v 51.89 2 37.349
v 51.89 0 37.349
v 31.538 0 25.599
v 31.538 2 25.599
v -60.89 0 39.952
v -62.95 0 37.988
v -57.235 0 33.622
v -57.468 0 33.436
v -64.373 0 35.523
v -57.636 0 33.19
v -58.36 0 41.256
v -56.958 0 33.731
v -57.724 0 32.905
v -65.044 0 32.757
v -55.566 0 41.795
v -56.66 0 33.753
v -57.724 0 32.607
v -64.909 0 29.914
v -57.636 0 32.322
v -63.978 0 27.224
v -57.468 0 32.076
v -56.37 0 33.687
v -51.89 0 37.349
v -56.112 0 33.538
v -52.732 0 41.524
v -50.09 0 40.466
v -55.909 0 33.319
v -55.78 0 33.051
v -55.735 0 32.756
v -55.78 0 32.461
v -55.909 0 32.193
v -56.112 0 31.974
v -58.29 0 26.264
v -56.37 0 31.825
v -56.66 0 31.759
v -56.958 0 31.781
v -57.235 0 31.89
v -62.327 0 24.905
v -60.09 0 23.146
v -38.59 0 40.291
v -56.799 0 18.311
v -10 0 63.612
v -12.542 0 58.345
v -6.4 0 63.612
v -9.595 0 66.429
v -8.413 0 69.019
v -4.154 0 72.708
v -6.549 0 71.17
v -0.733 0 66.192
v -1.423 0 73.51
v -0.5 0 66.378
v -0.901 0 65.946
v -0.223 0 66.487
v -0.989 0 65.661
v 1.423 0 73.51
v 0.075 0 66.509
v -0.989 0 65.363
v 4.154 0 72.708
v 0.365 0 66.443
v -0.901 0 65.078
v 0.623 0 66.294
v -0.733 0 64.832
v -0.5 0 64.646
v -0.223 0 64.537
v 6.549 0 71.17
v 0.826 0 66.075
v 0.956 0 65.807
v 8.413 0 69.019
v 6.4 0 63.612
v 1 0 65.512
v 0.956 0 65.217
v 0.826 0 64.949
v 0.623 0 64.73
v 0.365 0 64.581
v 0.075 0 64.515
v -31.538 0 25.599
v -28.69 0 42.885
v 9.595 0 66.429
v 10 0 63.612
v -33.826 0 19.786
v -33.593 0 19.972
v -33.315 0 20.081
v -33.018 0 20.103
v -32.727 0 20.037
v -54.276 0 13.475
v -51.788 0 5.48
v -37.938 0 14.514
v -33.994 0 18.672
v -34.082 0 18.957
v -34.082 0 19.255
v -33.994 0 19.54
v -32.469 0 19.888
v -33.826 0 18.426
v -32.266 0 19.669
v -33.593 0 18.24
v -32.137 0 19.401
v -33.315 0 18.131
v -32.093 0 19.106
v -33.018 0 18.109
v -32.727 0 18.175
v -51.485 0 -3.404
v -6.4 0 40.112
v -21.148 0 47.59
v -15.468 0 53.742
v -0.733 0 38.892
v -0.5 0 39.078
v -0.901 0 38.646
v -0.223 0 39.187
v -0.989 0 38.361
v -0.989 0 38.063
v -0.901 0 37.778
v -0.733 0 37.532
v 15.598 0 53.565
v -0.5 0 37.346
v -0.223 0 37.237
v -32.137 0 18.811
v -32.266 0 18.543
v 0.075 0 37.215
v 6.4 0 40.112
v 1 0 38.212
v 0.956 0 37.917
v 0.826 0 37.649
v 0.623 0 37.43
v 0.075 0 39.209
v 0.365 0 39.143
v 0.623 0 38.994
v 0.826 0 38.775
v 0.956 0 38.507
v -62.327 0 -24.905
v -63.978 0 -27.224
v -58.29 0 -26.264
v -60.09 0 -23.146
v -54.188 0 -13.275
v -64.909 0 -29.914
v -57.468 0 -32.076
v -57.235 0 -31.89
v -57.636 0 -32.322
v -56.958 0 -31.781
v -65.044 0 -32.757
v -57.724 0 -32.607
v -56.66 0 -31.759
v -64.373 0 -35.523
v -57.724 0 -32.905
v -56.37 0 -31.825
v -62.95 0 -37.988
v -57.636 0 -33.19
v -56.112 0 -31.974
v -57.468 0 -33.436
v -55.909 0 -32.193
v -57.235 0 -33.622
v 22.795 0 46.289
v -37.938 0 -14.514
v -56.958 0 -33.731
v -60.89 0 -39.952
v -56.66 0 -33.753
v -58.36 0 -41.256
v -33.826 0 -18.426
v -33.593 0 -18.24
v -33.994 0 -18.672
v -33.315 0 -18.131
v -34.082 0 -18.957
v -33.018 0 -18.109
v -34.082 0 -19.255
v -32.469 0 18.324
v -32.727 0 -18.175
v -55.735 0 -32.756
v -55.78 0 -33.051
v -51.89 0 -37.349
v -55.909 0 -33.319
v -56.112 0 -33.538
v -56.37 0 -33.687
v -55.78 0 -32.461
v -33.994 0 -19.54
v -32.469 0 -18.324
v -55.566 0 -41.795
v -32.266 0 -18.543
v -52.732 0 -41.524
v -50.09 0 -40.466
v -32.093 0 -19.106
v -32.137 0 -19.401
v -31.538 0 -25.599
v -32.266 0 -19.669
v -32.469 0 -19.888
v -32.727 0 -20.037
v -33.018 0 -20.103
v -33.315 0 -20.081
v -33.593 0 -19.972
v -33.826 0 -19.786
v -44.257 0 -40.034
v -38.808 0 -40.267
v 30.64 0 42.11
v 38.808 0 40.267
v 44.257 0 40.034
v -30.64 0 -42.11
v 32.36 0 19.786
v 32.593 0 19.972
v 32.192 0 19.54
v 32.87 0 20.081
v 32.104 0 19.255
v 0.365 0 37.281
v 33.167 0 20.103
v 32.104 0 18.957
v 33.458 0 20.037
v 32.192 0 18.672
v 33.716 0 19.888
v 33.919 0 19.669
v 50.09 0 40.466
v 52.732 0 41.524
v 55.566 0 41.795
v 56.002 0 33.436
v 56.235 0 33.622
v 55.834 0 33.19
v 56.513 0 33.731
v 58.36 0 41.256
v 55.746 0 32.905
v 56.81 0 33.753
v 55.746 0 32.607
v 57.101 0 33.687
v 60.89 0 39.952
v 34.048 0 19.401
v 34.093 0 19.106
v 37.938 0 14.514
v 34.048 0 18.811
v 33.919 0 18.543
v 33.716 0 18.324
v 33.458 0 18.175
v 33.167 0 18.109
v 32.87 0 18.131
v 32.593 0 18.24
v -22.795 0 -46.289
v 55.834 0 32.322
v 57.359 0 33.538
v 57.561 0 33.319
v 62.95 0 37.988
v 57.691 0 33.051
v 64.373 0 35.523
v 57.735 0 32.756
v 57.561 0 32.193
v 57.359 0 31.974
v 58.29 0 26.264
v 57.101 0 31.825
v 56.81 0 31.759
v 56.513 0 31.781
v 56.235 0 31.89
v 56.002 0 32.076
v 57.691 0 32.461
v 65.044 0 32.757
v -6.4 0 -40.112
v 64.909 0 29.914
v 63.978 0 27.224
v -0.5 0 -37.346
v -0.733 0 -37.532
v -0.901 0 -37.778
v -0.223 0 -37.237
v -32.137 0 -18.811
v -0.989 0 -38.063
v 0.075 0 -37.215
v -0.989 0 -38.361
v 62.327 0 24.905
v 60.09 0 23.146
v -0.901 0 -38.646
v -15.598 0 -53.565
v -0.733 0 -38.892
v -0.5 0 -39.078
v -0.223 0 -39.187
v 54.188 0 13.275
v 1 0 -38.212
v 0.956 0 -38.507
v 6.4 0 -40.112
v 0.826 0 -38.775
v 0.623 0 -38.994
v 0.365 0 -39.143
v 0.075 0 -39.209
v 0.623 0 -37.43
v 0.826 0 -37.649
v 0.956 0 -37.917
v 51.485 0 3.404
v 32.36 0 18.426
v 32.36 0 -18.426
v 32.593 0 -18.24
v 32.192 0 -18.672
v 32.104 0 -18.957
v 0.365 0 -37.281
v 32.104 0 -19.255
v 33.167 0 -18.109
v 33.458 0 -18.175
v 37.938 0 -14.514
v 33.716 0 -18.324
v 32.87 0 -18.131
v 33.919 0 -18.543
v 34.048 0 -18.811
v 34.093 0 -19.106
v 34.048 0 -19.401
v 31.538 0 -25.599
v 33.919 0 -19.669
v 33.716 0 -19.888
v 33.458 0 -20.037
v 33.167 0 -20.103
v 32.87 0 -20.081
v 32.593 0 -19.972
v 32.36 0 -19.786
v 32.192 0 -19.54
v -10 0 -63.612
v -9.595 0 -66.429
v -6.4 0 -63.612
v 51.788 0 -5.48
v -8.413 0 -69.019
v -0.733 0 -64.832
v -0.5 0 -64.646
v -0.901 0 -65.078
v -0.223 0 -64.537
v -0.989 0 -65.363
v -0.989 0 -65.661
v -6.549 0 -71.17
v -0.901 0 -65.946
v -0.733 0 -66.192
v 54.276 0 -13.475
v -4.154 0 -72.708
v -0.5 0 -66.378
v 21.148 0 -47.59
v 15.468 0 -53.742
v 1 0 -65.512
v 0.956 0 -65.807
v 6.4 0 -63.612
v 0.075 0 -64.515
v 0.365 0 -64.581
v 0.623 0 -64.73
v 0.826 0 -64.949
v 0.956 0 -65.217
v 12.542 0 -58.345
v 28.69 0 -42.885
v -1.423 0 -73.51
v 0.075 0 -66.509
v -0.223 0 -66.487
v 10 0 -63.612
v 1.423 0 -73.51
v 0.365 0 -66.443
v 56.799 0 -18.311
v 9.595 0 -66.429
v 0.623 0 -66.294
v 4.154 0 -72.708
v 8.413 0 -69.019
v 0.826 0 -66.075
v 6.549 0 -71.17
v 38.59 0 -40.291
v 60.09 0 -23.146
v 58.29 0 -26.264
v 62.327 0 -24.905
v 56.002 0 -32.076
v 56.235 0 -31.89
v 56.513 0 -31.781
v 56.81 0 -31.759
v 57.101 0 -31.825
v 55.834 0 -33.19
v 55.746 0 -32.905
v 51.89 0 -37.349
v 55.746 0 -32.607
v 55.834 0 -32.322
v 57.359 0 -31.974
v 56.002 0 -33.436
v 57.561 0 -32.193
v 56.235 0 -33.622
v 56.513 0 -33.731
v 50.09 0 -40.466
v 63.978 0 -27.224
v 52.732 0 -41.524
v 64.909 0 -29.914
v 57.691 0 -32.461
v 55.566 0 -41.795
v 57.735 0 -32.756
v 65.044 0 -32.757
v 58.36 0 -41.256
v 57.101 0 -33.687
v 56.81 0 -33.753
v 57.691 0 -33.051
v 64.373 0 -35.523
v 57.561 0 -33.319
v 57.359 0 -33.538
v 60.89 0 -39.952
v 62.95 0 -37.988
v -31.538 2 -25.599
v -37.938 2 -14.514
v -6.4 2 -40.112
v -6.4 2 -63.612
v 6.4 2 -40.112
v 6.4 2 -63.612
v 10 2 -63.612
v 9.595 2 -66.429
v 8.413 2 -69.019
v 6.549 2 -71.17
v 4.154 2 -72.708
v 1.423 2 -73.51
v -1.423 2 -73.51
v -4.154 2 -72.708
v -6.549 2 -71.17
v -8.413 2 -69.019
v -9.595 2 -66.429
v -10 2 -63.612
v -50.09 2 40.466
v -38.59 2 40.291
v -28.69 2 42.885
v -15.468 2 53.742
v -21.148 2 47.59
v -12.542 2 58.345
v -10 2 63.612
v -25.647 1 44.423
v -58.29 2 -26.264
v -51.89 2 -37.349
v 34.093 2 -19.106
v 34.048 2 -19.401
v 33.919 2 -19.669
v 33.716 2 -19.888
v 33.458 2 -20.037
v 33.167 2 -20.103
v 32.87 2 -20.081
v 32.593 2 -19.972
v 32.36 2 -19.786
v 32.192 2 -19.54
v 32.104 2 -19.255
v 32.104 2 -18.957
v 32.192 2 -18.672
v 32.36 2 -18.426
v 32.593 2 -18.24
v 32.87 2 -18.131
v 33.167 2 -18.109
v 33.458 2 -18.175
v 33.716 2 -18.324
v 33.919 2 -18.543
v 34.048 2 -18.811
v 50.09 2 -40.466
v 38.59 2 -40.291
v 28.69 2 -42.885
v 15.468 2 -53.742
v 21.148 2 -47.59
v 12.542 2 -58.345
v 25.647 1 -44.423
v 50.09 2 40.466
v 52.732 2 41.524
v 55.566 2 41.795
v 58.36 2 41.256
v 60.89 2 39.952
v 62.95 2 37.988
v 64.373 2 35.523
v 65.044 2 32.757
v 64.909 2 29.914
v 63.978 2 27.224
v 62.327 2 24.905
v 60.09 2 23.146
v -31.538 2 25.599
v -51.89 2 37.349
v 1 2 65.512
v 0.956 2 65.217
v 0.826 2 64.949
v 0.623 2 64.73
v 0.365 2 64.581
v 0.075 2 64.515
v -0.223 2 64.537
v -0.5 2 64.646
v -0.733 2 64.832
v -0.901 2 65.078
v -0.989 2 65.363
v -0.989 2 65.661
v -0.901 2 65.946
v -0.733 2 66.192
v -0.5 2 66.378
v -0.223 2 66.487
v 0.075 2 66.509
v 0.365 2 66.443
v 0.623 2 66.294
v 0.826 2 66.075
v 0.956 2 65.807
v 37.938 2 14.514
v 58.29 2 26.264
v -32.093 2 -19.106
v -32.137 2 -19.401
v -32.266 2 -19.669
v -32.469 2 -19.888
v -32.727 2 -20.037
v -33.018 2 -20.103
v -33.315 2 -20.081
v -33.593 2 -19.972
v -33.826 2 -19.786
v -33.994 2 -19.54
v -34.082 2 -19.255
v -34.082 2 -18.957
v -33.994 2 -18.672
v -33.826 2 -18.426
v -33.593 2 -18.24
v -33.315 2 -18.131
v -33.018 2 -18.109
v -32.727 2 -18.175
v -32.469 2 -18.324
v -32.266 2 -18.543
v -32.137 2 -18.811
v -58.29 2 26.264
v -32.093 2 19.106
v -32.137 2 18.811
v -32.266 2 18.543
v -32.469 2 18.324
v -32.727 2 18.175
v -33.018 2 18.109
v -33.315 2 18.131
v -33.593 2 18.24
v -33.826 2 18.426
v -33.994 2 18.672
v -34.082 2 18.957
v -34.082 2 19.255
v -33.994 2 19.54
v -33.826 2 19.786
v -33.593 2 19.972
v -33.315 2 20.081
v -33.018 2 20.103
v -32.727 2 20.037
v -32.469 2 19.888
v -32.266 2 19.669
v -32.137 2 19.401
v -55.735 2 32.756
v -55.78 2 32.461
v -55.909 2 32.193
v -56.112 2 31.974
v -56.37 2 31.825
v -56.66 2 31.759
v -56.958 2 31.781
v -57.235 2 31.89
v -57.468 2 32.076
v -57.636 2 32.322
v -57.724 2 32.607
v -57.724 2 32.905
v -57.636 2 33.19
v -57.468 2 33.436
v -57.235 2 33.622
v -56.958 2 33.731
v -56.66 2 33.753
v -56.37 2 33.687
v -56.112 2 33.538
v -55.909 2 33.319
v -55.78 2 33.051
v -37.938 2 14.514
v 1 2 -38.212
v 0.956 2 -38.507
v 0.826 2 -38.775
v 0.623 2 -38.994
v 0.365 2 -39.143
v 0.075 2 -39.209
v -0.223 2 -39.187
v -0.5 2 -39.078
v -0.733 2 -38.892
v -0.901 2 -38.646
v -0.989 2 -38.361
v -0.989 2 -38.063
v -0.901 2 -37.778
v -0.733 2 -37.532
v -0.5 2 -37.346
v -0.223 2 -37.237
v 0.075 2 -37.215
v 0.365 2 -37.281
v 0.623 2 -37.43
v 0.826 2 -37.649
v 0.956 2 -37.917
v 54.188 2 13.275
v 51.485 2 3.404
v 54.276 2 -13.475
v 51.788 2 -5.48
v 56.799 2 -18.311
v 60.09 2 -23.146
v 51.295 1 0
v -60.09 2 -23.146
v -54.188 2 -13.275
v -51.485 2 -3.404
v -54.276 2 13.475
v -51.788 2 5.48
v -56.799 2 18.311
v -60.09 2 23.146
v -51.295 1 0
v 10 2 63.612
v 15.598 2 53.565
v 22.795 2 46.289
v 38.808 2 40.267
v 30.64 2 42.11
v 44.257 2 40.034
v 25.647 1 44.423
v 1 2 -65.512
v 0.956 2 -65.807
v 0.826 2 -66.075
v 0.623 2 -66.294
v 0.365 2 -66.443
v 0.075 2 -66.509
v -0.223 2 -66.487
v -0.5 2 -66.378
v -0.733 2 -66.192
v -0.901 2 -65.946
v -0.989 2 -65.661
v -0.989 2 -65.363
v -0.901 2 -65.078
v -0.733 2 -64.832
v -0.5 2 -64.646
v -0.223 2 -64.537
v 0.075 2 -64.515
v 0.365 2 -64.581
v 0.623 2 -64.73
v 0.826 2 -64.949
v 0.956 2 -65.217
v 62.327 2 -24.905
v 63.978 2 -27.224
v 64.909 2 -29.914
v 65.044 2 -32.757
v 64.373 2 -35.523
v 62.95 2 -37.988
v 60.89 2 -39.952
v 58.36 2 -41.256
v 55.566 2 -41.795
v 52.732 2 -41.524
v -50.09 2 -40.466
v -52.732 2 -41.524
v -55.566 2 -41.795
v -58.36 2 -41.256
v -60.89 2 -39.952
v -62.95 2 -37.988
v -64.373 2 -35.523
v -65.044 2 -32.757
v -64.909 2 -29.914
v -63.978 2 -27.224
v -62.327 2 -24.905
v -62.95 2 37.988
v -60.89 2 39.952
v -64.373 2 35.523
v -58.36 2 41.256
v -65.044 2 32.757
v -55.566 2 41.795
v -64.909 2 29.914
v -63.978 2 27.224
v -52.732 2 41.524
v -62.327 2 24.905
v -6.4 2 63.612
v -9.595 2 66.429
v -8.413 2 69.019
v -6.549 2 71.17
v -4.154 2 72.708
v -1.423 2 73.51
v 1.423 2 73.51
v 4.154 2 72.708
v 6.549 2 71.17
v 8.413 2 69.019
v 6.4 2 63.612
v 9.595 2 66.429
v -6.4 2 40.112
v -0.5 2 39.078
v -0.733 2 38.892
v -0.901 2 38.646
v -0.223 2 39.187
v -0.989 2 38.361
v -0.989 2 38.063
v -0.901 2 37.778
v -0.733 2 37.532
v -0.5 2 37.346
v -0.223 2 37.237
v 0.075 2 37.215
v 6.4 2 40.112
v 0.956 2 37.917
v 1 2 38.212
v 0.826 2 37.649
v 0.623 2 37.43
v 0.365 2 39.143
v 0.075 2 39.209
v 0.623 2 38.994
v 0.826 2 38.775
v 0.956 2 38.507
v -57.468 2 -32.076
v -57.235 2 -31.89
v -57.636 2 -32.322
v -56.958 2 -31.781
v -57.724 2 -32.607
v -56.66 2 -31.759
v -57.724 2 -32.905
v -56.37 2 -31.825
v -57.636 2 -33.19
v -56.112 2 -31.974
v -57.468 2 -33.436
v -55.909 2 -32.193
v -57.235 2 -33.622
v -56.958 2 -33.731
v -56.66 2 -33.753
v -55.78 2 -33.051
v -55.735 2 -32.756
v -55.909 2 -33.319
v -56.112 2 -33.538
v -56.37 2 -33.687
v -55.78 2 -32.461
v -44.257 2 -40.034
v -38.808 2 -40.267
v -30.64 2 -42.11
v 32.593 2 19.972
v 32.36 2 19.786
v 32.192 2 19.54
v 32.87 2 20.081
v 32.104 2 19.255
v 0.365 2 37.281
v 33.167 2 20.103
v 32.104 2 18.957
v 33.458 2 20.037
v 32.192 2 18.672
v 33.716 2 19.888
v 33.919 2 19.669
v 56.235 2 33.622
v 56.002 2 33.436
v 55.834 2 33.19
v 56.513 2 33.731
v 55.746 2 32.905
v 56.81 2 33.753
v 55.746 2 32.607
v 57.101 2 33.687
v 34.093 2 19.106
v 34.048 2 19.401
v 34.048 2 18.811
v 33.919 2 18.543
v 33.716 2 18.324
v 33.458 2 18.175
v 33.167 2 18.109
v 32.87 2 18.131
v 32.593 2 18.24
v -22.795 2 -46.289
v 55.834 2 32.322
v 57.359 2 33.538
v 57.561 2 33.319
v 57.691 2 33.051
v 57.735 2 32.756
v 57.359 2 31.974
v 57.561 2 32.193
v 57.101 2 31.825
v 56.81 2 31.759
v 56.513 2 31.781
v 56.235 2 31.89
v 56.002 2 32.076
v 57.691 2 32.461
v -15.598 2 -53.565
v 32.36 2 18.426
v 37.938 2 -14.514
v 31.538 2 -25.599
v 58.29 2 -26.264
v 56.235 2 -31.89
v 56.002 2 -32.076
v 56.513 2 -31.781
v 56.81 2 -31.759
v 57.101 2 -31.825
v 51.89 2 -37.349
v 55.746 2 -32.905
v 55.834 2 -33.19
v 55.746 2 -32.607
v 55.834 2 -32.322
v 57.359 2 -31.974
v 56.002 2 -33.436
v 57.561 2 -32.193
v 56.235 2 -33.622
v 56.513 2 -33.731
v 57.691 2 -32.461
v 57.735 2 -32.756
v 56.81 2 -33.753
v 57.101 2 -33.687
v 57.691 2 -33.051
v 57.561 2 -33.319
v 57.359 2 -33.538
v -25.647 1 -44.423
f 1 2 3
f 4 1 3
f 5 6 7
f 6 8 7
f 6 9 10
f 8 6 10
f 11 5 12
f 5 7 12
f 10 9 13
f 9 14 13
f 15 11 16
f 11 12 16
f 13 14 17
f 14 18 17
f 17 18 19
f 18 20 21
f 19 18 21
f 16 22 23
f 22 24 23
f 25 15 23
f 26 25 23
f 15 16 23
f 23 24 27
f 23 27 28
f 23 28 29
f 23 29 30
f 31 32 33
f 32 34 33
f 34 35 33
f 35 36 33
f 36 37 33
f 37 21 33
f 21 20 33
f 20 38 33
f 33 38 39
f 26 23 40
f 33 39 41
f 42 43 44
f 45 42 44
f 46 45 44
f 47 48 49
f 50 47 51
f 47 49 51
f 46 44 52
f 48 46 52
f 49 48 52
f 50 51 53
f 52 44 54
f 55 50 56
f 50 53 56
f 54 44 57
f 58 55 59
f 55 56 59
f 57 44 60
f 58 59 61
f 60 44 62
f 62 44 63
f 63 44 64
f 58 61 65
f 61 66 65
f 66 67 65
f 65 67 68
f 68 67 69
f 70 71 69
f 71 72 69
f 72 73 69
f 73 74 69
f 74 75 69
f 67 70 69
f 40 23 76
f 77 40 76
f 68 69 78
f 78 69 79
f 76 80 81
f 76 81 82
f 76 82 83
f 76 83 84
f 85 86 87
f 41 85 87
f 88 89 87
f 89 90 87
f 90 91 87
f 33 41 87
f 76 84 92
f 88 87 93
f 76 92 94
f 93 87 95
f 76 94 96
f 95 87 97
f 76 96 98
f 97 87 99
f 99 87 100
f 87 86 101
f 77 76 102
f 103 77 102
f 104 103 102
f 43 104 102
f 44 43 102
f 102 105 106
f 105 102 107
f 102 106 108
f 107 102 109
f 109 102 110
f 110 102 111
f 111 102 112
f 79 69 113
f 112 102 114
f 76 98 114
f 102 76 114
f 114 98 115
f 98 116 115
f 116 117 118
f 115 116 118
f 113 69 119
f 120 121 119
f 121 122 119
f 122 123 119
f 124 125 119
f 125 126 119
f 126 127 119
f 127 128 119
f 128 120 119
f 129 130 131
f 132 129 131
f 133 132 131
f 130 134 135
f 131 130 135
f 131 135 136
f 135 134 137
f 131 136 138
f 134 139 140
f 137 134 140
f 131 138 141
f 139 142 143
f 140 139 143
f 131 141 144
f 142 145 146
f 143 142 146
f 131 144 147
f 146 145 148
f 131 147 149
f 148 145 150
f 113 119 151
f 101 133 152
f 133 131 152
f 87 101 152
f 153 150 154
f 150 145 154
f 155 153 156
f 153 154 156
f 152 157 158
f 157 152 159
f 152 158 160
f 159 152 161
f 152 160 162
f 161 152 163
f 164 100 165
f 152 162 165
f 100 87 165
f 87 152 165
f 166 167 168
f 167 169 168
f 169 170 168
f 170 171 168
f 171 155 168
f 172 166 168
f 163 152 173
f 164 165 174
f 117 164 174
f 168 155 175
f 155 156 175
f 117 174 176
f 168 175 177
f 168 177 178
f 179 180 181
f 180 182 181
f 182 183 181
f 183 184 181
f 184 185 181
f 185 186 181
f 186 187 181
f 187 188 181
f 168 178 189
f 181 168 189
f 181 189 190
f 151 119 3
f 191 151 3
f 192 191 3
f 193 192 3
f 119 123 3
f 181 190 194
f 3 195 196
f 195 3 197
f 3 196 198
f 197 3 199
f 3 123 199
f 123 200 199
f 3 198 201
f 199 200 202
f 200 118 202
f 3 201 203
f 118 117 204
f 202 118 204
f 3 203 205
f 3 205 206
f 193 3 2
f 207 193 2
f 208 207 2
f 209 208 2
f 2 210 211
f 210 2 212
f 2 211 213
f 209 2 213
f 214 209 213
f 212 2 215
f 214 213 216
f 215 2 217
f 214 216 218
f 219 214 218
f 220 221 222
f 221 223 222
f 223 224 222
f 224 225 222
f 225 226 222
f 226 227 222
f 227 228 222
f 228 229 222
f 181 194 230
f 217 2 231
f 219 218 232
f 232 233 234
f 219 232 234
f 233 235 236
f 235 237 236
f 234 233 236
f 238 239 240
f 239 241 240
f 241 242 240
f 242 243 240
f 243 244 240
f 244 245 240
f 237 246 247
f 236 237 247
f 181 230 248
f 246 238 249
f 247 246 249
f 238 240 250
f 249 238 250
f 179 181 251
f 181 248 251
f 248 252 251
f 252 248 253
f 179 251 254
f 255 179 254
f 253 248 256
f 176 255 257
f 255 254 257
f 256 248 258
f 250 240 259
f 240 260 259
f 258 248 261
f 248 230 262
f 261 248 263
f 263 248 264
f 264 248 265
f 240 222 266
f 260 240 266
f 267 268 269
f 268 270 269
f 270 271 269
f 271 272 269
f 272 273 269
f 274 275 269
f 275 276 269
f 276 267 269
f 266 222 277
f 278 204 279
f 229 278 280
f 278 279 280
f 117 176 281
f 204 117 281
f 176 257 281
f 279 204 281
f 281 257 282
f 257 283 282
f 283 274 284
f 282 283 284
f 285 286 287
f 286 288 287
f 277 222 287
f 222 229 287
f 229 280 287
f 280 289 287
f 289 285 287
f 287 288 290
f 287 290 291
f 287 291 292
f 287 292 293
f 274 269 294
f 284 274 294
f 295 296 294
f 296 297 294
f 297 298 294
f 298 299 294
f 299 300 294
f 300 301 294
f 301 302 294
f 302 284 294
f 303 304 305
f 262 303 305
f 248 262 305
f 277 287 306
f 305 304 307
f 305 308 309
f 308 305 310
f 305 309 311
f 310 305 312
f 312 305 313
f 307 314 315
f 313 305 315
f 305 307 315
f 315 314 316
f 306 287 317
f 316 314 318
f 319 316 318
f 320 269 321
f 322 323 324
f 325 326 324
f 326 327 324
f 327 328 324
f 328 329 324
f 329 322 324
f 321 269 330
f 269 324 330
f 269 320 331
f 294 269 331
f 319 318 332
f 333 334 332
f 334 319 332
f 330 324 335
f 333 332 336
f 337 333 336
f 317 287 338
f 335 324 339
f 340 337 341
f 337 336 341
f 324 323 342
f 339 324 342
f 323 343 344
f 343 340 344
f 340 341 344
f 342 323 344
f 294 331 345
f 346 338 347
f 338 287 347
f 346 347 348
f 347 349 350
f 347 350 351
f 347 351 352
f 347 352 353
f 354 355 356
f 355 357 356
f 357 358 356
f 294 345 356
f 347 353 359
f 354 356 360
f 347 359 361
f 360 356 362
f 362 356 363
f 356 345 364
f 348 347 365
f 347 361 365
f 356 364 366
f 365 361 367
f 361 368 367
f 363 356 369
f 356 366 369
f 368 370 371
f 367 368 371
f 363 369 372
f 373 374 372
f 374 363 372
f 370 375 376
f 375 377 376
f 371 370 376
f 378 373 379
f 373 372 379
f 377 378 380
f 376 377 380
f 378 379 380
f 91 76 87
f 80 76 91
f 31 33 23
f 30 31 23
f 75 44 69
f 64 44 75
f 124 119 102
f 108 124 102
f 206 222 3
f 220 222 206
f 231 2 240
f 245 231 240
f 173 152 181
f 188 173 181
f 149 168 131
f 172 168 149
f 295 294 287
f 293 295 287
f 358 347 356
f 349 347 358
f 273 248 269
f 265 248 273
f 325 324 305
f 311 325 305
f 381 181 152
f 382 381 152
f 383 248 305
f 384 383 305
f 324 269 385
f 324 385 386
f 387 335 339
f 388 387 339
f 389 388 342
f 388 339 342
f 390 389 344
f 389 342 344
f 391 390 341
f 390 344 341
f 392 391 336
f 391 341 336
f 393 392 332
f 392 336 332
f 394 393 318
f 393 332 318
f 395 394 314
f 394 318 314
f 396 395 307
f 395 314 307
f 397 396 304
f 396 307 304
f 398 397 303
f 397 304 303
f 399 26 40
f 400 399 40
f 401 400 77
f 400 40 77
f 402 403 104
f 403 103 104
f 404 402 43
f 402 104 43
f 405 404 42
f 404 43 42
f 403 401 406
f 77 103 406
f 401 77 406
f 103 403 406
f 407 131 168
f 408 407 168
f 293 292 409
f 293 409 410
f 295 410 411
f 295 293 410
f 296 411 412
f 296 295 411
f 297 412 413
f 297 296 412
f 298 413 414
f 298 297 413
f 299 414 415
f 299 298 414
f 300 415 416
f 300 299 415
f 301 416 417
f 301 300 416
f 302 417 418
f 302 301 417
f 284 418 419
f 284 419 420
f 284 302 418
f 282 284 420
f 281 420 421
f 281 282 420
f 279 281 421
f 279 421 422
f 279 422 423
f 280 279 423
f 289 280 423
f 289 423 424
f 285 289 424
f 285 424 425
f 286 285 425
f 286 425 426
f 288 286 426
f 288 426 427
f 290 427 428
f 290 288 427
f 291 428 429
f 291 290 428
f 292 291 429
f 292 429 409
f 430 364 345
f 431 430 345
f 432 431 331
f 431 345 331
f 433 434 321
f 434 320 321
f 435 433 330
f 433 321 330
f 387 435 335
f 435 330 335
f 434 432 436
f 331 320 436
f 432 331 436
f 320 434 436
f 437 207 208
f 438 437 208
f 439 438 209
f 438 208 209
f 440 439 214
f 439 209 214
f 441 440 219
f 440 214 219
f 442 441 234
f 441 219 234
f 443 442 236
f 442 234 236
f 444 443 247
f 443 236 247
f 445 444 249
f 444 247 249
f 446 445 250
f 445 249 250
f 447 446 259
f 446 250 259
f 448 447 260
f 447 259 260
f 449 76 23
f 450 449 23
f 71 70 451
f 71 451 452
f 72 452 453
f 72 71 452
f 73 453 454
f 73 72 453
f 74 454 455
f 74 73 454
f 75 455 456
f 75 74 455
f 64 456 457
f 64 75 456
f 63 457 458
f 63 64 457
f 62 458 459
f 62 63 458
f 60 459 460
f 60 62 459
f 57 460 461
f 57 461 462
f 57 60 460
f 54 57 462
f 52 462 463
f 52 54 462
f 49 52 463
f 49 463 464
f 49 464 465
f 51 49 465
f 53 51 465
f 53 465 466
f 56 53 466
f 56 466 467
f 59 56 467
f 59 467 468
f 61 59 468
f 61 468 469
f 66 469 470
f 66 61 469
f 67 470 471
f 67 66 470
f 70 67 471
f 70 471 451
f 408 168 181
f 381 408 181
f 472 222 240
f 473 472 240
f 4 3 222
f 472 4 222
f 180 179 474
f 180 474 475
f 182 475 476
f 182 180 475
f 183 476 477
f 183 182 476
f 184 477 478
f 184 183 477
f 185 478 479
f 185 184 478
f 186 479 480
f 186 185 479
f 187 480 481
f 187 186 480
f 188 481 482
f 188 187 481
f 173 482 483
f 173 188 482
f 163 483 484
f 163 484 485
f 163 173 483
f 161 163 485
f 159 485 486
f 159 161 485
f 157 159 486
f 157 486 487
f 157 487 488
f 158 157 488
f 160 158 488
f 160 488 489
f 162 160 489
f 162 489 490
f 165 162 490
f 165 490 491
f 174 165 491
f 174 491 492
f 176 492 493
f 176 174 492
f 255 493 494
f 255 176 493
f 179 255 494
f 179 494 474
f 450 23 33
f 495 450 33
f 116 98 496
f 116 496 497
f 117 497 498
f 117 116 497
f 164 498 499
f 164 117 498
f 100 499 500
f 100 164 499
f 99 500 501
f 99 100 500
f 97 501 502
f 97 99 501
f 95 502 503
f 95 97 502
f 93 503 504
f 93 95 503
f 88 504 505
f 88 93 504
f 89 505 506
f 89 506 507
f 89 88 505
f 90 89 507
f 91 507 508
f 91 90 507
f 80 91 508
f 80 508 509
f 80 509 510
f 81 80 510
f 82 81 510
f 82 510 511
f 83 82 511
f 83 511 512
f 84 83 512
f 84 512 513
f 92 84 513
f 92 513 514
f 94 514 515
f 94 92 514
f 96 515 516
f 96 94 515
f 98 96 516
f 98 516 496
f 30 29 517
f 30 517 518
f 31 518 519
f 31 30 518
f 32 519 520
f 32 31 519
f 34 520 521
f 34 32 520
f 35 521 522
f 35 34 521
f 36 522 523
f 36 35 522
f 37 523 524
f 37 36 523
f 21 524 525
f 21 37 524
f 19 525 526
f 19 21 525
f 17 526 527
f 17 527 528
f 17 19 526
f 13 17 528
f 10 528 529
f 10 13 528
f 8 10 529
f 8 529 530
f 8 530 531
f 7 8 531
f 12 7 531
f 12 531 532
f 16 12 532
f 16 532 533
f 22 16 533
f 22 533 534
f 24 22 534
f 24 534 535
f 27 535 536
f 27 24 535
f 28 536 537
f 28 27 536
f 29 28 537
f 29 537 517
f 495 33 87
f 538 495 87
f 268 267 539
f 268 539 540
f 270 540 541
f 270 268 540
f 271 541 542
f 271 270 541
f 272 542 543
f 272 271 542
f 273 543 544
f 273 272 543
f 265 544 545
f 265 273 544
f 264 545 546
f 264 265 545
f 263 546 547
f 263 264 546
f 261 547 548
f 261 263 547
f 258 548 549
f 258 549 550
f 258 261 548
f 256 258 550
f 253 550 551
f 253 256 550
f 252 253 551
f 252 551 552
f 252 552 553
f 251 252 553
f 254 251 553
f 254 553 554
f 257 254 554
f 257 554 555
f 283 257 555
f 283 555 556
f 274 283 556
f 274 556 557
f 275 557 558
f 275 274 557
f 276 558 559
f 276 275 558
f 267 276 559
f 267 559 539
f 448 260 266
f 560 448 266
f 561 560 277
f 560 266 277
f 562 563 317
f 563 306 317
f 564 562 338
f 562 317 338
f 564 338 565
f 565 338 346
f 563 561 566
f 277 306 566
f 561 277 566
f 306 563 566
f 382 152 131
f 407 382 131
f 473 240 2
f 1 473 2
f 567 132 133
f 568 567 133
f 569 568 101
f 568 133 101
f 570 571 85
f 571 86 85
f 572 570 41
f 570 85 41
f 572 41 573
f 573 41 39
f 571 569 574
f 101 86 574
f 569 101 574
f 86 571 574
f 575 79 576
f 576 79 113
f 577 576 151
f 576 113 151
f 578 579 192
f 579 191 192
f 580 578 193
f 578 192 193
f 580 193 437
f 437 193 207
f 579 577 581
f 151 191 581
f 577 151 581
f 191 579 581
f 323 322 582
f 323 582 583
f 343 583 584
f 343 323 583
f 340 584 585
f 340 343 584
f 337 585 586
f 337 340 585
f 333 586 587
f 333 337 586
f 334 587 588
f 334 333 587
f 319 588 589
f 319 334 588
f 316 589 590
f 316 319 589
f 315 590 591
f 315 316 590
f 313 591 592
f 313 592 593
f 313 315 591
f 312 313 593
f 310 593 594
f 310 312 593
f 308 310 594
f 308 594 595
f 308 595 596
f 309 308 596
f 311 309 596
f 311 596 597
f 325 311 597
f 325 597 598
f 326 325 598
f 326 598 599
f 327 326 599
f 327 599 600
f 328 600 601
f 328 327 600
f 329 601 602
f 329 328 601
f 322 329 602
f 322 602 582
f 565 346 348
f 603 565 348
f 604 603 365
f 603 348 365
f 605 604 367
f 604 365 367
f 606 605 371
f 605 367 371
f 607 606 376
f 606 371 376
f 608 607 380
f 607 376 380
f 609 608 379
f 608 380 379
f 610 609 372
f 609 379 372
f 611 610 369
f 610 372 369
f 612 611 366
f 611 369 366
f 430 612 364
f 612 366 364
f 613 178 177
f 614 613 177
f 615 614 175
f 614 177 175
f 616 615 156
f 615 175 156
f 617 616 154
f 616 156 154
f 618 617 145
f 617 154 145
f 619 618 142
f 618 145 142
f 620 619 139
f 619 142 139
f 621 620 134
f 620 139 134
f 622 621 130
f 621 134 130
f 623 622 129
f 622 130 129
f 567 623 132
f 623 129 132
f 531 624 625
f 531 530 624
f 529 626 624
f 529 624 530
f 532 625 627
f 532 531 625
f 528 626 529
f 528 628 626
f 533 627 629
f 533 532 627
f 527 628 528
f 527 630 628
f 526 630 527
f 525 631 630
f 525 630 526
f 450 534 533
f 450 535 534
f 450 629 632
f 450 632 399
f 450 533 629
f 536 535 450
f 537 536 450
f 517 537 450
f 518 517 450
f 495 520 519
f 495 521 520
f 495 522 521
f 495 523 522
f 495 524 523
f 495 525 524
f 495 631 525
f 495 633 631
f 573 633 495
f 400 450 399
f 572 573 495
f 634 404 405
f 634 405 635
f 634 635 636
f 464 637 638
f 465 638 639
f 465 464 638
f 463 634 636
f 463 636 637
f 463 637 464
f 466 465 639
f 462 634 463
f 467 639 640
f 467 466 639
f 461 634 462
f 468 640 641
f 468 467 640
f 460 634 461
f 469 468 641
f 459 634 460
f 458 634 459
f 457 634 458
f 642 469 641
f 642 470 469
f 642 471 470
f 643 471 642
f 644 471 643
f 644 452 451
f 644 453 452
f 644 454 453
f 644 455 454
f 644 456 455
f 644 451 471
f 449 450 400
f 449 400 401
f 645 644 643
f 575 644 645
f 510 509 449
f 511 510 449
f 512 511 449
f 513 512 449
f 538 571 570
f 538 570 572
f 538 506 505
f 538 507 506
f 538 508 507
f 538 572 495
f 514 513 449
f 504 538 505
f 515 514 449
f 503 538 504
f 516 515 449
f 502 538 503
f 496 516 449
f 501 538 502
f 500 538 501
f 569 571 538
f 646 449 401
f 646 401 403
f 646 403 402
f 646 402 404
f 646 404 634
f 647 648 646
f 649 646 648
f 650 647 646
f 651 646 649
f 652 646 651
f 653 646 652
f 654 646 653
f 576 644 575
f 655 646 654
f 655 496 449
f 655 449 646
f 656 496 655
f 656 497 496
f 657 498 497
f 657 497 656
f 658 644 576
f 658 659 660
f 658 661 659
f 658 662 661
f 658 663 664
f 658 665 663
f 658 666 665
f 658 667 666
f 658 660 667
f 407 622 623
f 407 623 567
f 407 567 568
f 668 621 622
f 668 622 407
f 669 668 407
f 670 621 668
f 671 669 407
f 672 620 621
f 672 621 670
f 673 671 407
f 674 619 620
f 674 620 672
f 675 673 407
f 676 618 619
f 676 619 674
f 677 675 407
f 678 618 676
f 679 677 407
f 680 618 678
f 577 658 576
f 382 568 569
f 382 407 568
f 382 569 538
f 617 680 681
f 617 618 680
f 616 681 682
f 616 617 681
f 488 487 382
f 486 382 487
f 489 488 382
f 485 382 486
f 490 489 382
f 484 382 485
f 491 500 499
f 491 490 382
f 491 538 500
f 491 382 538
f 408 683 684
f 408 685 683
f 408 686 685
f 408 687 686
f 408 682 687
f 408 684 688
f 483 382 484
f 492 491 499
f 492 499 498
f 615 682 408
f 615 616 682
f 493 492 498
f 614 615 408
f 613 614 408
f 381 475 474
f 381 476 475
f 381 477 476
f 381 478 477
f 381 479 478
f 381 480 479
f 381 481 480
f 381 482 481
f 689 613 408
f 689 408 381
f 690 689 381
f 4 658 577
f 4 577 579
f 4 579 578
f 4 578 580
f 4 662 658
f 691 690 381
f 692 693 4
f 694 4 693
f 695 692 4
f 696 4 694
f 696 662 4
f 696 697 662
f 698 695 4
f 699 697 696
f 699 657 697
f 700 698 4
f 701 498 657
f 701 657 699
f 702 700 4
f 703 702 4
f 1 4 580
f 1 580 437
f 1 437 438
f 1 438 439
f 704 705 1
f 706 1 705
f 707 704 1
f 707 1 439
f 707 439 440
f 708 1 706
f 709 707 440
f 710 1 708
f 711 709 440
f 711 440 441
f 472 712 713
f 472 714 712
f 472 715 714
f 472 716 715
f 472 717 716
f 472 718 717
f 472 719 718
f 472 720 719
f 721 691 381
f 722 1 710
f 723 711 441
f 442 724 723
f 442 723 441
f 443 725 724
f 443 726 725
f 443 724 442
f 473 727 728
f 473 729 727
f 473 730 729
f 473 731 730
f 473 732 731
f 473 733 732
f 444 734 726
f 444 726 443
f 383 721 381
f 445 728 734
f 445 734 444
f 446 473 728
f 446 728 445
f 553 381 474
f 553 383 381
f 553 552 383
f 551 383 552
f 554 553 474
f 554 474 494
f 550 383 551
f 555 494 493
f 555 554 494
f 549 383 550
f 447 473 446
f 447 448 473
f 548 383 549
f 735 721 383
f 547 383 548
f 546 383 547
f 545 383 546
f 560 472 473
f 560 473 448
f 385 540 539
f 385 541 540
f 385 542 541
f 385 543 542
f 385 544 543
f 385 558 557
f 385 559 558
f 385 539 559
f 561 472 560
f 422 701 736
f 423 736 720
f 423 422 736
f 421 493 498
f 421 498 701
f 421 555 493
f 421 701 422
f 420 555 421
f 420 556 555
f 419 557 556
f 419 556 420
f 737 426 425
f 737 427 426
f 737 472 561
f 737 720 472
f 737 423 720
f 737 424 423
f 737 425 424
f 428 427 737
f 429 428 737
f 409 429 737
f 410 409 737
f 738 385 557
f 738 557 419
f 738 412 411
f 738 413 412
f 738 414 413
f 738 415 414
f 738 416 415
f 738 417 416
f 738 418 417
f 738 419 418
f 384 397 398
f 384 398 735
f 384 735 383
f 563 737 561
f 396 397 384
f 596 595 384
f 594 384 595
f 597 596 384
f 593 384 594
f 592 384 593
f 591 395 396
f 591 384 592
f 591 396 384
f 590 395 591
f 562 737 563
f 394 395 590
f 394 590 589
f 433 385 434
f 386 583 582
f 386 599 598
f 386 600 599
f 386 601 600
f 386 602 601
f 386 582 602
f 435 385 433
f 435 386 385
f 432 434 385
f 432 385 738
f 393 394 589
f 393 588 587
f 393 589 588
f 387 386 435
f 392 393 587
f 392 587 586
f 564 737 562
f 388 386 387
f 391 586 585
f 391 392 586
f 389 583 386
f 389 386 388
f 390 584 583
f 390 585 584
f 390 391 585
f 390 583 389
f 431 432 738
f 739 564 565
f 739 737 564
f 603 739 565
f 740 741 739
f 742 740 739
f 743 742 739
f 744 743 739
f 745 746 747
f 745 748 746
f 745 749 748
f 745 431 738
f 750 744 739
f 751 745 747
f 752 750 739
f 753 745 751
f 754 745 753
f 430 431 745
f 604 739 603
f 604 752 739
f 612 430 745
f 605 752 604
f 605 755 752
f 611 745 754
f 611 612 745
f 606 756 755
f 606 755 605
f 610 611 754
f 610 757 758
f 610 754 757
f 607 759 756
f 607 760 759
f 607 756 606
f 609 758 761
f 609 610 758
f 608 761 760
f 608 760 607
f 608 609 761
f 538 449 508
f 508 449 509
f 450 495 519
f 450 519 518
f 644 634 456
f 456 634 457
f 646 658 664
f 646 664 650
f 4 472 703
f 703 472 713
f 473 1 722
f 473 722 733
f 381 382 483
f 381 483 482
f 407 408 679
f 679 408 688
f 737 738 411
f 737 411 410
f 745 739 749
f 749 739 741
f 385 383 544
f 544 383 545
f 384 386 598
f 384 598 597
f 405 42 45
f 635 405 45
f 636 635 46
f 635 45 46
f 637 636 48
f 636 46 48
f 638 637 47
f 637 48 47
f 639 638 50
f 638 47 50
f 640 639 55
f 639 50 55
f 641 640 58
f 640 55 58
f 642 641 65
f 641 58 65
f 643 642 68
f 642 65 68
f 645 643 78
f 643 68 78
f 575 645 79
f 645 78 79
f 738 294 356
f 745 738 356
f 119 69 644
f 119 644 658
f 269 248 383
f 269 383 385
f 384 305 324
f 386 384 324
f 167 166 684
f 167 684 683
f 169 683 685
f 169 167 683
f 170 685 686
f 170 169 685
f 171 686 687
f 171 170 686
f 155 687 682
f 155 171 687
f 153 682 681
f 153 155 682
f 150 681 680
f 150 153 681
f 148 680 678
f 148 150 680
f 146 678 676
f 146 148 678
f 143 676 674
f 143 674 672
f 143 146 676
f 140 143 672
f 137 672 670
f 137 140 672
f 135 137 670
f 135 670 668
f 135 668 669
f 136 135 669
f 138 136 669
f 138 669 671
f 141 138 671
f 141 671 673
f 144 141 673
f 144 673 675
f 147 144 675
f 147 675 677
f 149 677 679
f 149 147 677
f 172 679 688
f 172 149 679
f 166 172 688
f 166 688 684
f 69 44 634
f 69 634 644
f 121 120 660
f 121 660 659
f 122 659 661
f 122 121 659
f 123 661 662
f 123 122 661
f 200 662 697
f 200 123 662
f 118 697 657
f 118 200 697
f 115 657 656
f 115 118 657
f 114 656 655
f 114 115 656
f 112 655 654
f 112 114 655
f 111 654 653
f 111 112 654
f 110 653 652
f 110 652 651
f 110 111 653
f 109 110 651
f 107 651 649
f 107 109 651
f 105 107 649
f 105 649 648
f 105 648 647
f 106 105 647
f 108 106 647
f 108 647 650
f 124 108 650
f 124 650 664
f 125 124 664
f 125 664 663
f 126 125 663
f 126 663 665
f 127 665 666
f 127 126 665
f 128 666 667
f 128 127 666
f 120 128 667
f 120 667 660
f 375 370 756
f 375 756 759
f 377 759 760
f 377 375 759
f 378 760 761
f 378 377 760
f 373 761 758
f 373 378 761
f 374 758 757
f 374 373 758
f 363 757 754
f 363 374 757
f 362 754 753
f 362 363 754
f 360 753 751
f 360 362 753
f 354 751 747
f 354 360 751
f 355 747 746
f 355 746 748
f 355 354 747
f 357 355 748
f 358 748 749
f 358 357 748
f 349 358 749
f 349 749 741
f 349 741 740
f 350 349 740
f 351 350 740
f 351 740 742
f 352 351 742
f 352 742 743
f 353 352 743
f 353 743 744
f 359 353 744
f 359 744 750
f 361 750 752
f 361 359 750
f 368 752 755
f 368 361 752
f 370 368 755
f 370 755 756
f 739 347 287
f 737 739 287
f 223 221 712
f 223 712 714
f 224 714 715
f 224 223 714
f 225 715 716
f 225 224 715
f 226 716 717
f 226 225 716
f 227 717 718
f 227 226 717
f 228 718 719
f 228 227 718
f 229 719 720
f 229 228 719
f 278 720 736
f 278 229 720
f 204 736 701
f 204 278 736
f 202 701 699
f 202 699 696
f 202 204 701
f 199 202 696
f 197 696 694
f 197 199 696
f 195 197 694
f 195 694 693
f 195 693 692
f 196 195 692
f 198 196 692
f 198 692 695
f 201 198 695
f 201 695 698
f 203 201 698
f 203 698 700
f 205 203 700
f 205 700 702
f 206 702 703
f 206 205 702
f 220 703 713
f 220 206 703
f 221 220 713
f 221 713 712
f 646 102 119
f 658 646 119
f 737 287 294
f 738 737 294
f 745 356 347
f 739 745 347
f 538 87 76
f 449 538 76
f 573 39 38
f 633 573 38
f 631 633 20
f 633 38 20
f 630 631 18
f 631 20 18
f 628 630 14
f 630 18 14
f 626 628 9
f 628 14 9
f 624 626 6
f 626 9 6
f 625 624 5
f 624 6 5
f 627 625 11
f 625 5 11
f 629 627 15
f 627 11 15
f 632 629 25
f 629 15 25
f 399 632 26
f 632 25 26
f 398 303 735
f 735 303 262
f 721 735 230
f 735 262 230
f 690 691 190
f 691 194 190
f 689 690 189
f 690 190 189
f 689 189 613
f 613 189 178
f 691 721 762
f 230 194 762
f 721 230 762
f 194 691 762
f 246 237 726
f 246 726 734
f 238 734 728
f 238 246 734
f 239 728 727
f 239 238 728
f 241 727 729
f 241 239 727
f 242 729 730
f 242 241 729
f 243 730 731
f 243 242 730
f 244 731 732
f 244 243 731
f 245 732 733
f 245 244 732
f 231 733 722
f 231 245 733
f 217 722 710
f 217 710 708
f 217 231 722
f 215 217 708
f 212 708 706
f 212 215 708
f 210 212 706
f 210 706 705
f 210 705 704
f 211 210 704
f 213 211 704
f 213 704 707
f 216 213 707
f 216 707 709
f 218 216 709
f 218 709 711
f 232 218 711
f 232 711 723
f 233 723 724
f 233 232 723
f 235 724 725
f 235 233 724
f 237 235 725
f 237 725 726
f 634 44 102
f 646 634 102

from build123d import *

# Parameters (mm, degrees)
SKETCH4_W           = 12.8
SKETCH4_H           = 23.5
SKETCH4_R           = 1
BOSS_EXTRUDE3_DEPTH = 2


with BuildPart() as part:
    # Sketch4 → Boss-Extrude3 (new body)
    with BuildSketch(Plane(origin=(0, 0, 0), x_dir=(1, 0, 0), z_dir=(0, 1, 0))):
        with BuildLine():
            ThreePointArc((10, 63.612159322), (0, 73.612159322), (-10, 63.612159322))
            add(Edge.make_bspline(
                [(-10, 63.612159322), (-21.25, 36.806079661), (-50.089745962, 40.466333699)],
                knots=[0, 0, 0, 1, 1, 1], degree=2))
            ThreePointArc((-50.089745962, 40.466333699), (-63.75, 36.806079661), (-60.089745962, 23.145825623))
            add(Edge.make_bspline(
                [(-60.089745962, 23.145825623), (-42.5, 0), (-60.089745962, -23.145825623)],
                knots=[0, 0, 0, 1, 1, 1], degree=2))
            ThreePointArc((-60.089745962, -23.145825623), (-63.75, -36.806079661), (-50.089745962, -40.466333699))
            add(Edge.make_bspline(
                [(-50.089745962, -40.466333699), (-21.25, -36.806079661), (-10, -63.612159322)],
                knots=[0, 0, 0, 1, 1, 1], degree=2))
            ThreePointArc((-10, -63.612159322), (0, -73.612159322), (10, -63.612159322))
            add(Edge.make_bspline(
                [(10, -63.612159322), (21.25, -36.806079661), (50.089745962, -40.466333699)],
                knots=[0, 0, 0, 1, 1, 1], degree=2))
            ThreePointArc((50.089745962, -40.466333699), (63.75, -36.806079661), (60.089745962, -23.145825623))
            add(Edge.make_bspline(
                [(60.089745962, -23.145825623), (42.5, 0), (60.089745962, 23.145825623)],
                knots=[0, 0, 0, 1, 1, 1], degree=2))
            ThreePointArc((60.089745962, 23.145825623), (63.75, 36.806079661), (50.089745962, 40.466333699))
            add(Edge.make_bspline(
                [(50.089745962, 40.466333699), (21.25, 36.806079661), (10, 63.612159322)],
                knots=[0, 0, 0, 1, 1, 1], degree=2))
        make_face()
        with Locations((0, 51.862159322)):
            Rectangle(SKETCH4_W, SKETCH4_H, mode=Mode.SUBTRACT)
        with Locations((0, 65.512159322)):
            Circle(SKETCH4_R, mode=Mode.SUBTRACT)
        Polygon((31.538148973, 25.598642245), (51.889745962, 37.348642245), (58.289745962, 26.263517077), (37.938148973, 14.513517077), align=None, mode=Mode.SUBTRACT)
        Polygon((37.938148973, -14.513517077), (58.289745962, -26.263517077), (51.889745962, -37.348642245), (31.538148973, -25.598642245), align=None, mode=Mode.SUBTRACT)
        with Locations((0, -51.862159322)):
            Rectangle(SKETCH4_W, SKETCH4_H, mode=Mode.SUBTRACT)
        Polygon((-31.538148973, -25.598642245), (-51.889745962, -37.348642245), (-58.289745962, -26.263517077), (-37.938148973, -14.513517077), align=None, mode=Mode.SUBTRACT)
        Polygon((-37.938148973, 14.513517077), (-58.289745962, 26.263517077), (-51.889745962, 37.348642245), (-31.538148973, 25.598642245), align=None, mode=Mode.SUBTRACT)
        with Locations((33.092700706, 19.106079661)):
            Circle(SKETCH4_R, mode=Mode.SUBTRACT)
        with Locations((0, 38.212159322)):
            Circle(SKETCH4_R, mode=Mode.SUBTRACT)
        with Locations((-33.092700706, -19.106079661)):
            Circle(SKETCH4_R, mode=Mode.SUBTRACT)
        with Locations((0, -38.212159322)):
            Circle(SKETCH4_R, mode=Mode.SUBTRACT)
        with Locations((33.092700706, -19.106079661)):
            Circle(SKETCH4_R, mode=Mode.SUBTRACT)
        with Locations((-33.092700706, 19.106079661)):
            Circle(SKETCH4_R, mode=Mode.SUBTRACT)
        with Locations((56.735194229, 32.756079661)):
            Circle(SKETCH4_R, mode=Mode.SUBTRACT)
        with Locations((56.735194229, -32.756079661)):
            Circle(SKETCH4_R, mode=Mode.SUBTRACT)
        with Locations((0, -65.512159322)):
            Circle(SKETCH4_R, mode=Mode.SUBTRACT)
        with Locations((-56.735194229, -32.756079661)):
            Circle(SKETCH4_R, mode=Mode.SUBTRACT)
        with Locations((-56.735194229, 32.756079661)):
            Circle(SKETCH4_R, mode=Mode.SUBTRACT)
    extrude(amount=BOSS_EXTRUDE3_DEPTH)


solid = part.part
